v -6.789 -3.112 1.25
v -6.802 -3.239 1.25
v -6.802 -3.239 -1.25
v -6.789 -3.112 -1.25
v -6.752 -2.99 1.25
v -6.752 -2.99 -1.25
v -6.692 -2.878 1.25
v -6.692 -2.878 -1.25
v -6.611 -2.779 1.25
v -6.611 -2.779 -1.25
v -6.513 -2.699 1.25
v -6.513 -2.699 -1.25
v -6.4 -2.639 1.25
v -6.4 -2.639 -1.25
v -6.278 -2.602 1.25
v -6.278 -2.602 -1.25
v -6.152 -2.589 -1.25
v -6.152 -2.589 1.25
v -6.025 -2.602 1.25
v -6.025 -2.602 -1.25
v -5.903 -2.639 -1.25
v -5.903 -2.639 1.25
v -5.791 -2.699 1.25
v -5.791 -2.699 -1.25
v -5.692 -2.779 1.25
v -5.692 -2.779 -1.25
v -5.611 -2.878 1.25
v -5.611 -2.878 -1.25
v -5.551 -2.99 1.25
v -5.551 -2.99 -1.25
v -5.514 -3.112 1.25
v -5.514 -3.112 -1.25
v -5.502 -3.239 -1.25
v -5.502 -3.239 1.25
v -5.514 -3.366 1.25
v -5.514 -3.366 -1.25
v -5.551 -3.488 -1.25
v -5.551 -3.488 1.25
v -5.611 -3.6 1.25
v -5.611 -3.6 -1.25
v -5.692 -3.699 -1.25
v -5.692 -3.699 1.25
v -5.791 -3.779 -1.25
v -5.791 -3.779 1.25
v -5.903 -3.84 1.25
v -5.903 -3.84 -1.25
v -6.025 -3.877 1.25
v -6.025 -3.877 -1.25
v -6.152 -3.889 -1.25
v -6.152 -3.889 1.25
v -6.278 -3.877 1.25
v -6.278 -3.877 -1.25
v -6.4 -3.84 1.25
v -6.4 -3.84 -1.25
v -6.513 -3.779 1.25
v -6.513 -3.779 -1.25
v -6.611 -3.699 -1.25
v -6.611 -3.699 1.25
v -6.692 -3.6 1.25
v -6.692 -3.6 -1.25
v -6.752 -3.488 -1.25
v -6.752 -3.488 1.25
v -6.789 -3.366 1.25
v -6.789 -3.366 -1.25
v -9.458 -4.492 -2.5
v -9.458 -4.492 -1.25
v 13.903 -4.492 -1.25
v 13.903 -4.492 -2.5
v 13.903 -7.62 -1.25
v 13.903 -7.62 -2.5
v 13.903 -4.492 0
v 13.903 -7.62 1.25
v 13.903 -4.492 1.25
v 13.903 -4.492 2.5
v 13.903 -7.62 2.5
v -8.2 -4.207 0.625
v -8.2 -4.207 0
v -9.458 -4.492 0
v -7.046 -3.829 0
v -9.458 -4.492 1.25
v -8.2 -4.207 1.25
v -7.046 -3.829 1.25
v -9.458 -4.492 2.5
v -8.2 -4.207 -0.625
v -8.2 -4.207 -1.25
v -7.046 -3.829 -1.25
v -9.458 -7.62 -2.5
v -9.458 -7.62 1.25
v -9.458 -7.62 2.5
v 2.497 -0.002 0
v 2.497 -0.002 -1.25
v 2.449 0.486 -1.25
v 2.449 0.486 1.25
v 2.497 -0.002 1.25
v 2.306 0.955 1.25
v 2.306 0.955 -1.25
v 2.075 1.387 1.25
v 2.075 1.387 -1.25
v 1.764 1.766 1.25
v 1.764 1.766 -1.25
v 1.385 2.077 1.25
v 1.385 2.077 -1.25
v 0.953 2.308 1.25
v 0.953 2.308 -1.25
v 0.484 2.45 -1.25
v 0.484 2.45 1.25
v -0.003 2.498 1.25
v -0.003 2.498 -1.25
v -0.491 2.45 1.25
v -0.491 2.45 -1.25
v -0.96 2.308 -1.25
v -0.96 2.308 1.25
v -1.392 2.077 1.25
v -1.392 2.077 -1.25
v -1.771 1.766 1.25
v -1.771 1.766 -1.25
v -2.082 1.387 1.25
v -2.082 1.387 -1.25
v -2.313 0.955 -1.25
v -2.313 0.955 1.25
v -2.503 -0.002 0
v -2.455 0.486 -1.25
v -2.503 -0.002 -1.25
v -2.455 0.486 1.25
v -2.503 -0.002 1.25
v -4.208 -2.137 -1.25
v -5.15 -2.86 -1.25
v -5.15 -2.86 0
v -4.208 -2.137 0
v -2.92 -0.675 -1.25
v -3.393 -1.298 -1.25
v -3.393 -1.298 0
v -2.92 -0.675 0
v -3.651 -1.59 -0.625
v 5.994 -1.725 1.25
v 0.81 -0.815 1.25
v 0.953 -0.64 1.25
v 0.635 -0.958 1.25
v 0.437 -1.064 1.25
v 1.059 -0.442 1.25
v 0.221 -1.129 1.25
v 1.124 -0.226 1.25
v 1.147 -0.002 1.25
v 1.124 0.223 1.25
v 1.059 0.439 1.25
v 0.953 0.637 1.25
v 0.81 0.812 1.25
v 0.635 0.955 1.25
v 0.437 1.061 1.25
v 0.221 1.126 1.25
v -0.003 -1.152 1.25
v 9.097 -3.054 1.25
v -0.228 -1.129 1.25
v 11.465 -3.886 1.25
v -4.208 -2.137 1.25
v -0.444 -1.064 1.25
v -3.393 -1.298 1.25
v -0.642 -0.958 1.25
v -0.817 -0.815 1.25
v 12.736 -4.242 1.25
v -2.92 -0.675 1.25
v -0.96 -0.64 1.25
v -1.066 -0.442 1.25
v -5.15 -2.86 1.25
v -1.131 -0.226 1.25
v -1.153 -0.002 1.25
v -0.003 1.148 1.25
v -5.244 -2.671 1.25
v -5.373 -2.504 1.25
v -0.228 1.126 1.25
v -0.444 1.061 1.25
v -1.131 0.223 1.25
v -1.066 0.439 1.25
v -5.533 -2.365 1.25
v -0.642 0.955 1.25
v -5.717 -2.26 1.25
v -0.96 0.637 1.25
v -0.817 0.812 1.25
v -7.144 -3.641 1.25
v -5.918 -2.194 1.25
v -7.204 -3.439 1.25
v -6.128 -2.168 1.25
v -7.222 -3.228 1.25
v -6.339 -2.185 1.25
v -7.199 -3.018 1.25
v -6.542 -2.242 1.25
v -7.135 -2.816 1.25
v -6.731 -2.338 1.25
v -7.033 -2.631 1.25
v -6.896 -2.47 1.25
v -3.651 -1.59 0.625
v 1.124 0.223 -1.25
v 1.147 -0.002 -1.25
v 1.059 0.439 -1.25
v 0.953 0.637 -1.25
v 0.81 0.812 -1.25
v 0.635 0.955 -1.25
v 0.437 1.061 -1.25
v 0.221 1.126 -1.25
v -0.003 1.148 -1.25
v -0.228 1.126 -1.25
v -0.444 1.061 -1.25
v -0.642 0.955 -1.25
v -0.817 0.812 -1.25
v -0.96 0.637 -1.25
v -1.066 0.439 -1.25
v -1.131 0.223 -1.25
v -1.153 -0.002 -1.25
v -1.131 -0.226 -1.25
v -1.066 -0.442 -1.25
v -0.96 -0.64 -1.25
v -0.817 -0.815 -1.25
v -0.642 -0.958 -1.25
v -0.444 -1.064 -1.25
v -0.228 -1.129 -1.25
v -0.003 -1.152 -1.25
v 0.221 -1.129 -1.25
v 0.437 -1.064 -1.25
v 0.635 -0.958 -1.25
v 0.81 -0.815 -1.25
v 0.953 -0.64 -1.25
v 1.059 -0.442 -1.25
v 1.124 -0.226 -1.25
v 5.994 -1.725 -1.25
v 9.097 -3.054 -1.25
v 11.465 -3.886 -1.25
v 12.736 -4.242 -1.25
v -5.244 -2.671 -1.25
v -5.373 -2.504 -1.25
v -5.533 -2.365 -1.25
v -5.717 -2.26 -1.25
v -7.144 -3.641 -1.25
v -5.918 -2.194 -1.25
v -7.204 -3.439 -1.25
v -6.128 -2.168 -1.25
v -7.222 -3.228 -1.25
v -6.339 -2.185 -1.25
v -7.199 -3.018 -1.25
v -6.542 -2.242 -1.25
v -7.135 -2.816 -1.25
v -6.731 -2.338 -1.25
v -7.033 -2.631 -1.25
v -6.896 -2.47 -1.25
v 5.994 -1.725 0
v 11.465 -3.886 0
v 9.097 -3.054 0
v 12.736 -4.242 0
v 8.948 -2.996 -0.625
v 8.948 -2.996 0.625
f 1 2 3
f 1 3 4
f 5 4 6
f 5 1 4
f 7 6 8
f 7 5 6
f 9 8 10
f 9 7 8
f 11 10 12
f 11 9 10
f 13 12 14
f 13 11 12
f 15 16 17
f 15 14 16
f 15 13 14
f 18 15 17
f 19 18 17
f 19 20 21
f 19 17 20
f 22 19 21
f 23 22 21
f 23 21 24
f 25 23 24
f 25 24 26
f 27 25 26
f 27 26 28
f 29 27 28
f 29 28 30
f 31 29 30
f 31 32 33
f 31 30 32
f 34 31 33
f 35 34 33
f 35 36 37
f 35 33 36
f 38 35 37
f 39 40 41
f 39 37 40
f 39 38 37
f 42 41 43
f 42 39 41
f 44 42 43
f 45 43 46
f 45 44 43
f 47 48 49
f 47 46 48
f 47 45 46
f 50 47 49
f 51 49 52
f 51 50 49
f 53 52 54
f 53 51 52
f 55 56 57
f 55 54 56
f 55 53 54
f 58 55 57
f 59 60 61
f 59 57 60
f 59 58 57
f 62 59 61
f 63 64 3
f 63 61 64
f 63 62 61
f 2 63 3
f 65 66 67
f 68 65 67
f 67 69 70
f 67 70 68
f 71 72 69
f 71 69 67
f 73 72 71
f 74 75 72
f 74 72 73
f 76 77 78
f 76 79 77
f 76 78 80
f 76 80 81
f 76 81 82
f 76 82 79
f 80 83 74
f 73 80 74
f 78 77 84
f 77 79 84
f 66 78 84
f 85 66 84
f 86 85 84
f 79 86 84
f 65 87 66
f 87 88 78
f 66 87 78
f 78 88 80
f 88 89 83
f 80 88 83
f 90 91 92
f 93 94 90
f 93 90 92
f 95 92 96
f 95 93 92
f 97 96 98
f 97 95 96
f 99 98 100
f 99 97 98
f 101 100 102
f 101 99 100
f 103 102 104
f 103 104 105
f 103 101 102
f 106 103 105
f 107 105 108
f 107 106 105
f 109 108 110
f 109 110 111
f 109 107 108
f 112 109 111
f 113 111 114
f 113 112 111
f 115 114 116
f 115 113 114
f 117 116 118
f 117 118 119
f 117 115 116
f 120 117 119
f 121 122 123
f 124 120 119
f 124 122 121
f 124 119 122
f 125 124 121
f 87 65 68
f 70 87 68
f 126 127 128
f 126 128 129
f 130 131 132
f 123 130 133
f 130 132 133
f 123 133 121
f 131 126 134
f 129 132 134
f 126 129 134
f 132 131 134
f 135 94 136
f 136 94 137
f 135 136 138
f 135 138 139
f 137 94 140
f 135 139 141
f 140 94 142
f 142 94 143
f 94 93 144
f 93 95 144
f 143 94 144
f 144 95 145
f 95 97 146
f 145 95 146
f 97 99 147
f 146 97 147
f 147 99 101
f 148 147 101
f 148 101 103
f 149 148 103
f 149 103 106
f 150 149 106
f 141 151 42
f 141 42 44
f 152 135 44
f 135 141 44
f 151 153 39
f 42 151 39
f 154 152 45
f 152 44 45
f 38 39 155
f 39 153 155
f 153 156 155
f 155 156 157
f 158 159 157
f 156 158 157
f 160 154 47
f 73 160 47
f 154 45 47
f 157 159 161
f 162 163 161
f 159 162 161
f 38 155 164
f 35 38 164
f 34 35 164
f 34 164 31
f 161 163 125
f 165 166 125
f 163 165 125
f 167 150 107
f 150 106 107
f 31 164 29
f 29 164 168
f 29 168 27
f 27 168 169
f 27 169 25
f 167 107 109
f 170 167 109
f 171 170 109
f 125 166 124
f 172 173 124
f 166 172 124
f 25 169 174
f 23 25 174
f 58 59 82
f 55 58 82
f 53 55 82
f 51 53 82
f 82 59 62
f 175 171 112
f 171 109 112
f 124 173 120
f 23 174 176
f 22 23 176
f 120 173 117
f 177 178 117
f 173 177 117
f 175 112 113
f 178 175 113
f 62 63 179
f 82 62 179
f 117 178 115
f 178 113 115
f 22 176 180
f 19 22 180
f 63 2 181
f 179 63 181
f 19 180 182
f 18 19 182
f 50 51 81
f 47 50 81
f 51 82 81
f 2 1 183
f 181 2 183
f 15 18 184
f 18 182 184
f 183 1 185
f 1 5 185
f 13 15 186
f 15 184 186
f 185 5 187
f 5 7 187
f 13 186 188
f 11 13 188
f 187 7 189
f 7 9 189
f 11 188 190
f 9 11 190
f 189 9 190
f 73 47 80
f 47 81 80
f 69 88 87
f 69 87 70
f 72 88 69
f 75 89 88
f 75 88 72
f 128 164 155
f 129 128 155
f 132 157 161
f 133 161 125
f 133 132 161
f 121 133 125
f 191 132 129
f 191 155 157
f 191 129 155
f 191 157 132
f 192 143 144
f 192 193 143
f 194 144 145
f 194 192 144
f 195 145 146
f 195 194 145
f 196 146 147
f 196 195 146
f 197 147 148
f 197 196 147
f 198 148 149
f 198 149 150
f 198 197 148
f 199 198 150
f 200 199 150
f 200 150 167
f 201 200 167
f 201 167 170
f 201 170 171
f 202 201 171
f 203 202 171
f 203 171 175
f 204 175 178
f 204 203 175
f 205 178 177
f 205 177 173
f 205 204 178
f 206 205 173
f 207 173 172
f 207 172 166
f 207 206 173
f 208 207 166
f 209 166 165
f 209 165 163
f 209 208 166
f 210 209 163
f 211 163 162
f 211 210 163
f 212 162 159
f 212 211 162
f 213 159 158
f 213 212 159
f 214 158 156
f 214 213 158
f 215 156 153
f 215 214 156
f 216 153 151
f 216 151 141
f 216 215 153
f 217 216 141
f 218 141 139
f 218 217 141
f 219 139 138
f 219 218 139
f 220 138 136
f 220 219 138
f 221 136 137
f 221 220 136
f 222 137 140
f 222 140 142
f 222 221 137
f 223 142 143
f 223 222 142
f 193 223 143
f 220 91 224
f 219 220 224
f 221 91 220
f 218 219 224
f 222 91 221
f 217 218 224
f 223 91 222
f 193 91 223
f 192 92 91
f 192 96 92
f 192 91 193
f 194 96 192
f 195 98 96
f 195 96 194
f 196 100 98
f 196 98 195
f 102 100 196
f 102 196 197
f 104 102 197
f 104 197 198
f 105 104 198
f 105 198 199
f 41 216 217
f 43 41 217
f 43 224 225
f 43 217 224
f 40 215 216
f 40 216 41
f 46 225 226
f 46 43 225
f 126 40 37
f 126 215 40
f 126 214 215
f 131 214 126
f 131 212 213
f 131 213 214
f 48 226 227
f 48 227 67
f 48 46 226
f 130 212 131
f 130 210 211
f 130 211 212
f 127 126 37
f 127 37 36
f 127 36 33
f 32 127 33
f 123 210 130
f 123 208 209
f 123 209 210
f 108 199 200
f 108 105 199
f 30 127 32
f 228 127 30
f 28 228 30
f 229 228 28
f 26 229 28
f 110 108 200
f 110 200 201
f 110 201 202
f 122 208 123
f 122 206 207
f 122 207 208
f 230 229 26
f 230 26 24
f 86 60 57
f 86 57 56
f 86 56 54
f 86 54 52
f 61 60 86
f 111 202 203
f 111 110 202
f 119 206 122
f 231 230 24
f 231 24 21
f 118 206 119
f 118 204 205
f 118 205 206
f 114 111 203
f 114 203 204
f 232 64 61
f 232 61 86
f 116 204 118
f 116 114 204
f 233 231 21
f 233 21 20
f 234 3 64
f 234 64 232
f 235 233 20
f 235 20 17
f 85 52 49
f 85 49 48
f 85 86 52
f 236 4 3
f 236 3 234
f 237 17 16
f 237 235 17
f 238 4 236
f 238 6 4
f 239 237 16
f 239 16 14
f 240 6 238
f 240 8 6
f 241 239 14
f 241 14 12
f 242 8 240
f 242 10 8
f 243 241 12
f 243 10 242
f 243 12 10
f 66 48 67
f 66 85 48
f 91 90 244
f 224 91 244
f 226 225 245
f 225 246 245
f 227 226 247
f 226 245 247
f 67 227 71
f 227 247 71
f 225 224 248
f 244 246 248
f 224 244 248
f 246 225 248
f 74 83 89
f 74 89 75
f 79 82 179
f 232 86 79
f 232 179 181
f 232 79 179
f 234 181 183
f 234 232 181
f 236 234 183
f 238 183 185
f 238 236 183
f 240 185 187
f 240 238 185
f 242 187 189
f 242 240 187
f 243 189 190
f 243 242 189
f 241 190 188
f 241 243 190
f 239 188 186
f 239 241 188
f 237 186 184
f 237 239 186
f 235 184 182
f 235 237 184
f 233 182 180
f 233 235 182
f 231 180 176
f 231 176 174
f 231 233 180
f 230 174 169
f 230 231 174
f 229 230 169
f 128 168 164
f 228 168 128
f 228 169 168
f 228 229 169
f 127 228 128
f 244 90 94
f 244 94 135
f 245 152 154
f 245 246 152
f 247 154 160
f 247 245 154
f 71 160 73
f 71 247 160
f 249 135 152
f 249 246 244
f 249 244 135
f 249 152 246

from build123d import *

# Parameters (mm, degrees)
SKETCH1_R               = 1.15
BOSS_EXTRUDE1_DEPTH     = 1.25
SKETCH2_W               = 23.360657125
SKETCH2_H               = 3.127548608
BOSS_EXTRUDE2_DEPTH     = 2.5
SKETCH3_R               = 1.070838979
BOSS_EXTRUDE3_DEPTH     = 2.5
CUT_EXTRUDE1_DEPTH      = 17.966509656
CUT_EXTRUDE1_DEPTH_BACK = 17.966509656
SKETCH4_R               = 0.65


with BuildPart() as part:
    # Sketch1 → Boss-Extrude1 (new, symmetric)
    with BuildSketch(Plane.XY):
        with BuildLine():
            Line((-10.268002202, 0), (13.092654923, 0))
            Line((13.092654923, 0), (13.092654923, 3.127548608))
            add(Edge.make_bspline(
                [(1.686549766, 7.618415505), (8.886011908, 3.875396255), (13.092654923, 3.127548608)],
                knots=[0, 0, 0, 1, 1, 1], degree=2))
            ThreePointArc((1.686549766, 7.618415505), (-0.813450234, 10.118415505), (-3.313450234, 7.618415505))
            add(Edge.make_bspline(
                [(-10.268002202, 3.127548608), (-5.306289346, 4.030602712), (-3.313450234, 7.618415505)],
                knots=[0, 0, 0, 1, 1, 1], degree=2))
            Line((-10.268002202, 3.127548608), (-10.268002202, 0))
        make_face()
        with Locations((-0.813450234, 7.618415505)):
            Circle(SKETCH1_R, mode=Mode.SUBTRACT)
    extrude(amount=BOSS_EXTRUDE1_DEPTH, both=True)

    # Sketch2 → Boss-Extrude2 (add, symmetric)
    with BuildSketch(Plane.XY):
        with Locations((1.412326361, 1.563774304)):
            Rectangle(SKETCH2_W, SKETCH2_H)
    extrude(amount=BOSS_EXTRUDE2_DEPTH, both=True)

    # Sketch3 → Boss-Extrude3 (add)
    with BuildSketch(Plane(origin=(0, 0, -1.25), x_dir=(-1, 0, 0), z_dir=(0, 0, -1))):
        with Locations((6.96167169, 4.380964726)):
            Circle(SKETCH3_R)
    extrude(amount=-BOSS_EXTRUDE3_DEPTH)

    # Sketch4 → Cut-Extrude1 (cut, two sides: drawn at the far end of the back side and taken through both)
    with BuildSketch(Plane(origin=(0, 0, -1.25), x_dir=(-1, 0, 0), z_dir=(0, 0, -1)).offset(-CUT_EXTRUDE1_DEPTH_BACK)):
        with Locations((6.96167169, 4.380964726)):
            Circle(SKETCH4_R)
    extrude(amount=CUT_EXTRUDE1_DEPTH + CUT_EXTRUDE1_DEPTH_BACK, mode=Mode.SUBTRACT)


with BuildPart() as part_1:
    # Body-Move/Copy1: moved
    add(part.part.moved(Location((0.81, -7.62, 0))))


solid = part_1.part
